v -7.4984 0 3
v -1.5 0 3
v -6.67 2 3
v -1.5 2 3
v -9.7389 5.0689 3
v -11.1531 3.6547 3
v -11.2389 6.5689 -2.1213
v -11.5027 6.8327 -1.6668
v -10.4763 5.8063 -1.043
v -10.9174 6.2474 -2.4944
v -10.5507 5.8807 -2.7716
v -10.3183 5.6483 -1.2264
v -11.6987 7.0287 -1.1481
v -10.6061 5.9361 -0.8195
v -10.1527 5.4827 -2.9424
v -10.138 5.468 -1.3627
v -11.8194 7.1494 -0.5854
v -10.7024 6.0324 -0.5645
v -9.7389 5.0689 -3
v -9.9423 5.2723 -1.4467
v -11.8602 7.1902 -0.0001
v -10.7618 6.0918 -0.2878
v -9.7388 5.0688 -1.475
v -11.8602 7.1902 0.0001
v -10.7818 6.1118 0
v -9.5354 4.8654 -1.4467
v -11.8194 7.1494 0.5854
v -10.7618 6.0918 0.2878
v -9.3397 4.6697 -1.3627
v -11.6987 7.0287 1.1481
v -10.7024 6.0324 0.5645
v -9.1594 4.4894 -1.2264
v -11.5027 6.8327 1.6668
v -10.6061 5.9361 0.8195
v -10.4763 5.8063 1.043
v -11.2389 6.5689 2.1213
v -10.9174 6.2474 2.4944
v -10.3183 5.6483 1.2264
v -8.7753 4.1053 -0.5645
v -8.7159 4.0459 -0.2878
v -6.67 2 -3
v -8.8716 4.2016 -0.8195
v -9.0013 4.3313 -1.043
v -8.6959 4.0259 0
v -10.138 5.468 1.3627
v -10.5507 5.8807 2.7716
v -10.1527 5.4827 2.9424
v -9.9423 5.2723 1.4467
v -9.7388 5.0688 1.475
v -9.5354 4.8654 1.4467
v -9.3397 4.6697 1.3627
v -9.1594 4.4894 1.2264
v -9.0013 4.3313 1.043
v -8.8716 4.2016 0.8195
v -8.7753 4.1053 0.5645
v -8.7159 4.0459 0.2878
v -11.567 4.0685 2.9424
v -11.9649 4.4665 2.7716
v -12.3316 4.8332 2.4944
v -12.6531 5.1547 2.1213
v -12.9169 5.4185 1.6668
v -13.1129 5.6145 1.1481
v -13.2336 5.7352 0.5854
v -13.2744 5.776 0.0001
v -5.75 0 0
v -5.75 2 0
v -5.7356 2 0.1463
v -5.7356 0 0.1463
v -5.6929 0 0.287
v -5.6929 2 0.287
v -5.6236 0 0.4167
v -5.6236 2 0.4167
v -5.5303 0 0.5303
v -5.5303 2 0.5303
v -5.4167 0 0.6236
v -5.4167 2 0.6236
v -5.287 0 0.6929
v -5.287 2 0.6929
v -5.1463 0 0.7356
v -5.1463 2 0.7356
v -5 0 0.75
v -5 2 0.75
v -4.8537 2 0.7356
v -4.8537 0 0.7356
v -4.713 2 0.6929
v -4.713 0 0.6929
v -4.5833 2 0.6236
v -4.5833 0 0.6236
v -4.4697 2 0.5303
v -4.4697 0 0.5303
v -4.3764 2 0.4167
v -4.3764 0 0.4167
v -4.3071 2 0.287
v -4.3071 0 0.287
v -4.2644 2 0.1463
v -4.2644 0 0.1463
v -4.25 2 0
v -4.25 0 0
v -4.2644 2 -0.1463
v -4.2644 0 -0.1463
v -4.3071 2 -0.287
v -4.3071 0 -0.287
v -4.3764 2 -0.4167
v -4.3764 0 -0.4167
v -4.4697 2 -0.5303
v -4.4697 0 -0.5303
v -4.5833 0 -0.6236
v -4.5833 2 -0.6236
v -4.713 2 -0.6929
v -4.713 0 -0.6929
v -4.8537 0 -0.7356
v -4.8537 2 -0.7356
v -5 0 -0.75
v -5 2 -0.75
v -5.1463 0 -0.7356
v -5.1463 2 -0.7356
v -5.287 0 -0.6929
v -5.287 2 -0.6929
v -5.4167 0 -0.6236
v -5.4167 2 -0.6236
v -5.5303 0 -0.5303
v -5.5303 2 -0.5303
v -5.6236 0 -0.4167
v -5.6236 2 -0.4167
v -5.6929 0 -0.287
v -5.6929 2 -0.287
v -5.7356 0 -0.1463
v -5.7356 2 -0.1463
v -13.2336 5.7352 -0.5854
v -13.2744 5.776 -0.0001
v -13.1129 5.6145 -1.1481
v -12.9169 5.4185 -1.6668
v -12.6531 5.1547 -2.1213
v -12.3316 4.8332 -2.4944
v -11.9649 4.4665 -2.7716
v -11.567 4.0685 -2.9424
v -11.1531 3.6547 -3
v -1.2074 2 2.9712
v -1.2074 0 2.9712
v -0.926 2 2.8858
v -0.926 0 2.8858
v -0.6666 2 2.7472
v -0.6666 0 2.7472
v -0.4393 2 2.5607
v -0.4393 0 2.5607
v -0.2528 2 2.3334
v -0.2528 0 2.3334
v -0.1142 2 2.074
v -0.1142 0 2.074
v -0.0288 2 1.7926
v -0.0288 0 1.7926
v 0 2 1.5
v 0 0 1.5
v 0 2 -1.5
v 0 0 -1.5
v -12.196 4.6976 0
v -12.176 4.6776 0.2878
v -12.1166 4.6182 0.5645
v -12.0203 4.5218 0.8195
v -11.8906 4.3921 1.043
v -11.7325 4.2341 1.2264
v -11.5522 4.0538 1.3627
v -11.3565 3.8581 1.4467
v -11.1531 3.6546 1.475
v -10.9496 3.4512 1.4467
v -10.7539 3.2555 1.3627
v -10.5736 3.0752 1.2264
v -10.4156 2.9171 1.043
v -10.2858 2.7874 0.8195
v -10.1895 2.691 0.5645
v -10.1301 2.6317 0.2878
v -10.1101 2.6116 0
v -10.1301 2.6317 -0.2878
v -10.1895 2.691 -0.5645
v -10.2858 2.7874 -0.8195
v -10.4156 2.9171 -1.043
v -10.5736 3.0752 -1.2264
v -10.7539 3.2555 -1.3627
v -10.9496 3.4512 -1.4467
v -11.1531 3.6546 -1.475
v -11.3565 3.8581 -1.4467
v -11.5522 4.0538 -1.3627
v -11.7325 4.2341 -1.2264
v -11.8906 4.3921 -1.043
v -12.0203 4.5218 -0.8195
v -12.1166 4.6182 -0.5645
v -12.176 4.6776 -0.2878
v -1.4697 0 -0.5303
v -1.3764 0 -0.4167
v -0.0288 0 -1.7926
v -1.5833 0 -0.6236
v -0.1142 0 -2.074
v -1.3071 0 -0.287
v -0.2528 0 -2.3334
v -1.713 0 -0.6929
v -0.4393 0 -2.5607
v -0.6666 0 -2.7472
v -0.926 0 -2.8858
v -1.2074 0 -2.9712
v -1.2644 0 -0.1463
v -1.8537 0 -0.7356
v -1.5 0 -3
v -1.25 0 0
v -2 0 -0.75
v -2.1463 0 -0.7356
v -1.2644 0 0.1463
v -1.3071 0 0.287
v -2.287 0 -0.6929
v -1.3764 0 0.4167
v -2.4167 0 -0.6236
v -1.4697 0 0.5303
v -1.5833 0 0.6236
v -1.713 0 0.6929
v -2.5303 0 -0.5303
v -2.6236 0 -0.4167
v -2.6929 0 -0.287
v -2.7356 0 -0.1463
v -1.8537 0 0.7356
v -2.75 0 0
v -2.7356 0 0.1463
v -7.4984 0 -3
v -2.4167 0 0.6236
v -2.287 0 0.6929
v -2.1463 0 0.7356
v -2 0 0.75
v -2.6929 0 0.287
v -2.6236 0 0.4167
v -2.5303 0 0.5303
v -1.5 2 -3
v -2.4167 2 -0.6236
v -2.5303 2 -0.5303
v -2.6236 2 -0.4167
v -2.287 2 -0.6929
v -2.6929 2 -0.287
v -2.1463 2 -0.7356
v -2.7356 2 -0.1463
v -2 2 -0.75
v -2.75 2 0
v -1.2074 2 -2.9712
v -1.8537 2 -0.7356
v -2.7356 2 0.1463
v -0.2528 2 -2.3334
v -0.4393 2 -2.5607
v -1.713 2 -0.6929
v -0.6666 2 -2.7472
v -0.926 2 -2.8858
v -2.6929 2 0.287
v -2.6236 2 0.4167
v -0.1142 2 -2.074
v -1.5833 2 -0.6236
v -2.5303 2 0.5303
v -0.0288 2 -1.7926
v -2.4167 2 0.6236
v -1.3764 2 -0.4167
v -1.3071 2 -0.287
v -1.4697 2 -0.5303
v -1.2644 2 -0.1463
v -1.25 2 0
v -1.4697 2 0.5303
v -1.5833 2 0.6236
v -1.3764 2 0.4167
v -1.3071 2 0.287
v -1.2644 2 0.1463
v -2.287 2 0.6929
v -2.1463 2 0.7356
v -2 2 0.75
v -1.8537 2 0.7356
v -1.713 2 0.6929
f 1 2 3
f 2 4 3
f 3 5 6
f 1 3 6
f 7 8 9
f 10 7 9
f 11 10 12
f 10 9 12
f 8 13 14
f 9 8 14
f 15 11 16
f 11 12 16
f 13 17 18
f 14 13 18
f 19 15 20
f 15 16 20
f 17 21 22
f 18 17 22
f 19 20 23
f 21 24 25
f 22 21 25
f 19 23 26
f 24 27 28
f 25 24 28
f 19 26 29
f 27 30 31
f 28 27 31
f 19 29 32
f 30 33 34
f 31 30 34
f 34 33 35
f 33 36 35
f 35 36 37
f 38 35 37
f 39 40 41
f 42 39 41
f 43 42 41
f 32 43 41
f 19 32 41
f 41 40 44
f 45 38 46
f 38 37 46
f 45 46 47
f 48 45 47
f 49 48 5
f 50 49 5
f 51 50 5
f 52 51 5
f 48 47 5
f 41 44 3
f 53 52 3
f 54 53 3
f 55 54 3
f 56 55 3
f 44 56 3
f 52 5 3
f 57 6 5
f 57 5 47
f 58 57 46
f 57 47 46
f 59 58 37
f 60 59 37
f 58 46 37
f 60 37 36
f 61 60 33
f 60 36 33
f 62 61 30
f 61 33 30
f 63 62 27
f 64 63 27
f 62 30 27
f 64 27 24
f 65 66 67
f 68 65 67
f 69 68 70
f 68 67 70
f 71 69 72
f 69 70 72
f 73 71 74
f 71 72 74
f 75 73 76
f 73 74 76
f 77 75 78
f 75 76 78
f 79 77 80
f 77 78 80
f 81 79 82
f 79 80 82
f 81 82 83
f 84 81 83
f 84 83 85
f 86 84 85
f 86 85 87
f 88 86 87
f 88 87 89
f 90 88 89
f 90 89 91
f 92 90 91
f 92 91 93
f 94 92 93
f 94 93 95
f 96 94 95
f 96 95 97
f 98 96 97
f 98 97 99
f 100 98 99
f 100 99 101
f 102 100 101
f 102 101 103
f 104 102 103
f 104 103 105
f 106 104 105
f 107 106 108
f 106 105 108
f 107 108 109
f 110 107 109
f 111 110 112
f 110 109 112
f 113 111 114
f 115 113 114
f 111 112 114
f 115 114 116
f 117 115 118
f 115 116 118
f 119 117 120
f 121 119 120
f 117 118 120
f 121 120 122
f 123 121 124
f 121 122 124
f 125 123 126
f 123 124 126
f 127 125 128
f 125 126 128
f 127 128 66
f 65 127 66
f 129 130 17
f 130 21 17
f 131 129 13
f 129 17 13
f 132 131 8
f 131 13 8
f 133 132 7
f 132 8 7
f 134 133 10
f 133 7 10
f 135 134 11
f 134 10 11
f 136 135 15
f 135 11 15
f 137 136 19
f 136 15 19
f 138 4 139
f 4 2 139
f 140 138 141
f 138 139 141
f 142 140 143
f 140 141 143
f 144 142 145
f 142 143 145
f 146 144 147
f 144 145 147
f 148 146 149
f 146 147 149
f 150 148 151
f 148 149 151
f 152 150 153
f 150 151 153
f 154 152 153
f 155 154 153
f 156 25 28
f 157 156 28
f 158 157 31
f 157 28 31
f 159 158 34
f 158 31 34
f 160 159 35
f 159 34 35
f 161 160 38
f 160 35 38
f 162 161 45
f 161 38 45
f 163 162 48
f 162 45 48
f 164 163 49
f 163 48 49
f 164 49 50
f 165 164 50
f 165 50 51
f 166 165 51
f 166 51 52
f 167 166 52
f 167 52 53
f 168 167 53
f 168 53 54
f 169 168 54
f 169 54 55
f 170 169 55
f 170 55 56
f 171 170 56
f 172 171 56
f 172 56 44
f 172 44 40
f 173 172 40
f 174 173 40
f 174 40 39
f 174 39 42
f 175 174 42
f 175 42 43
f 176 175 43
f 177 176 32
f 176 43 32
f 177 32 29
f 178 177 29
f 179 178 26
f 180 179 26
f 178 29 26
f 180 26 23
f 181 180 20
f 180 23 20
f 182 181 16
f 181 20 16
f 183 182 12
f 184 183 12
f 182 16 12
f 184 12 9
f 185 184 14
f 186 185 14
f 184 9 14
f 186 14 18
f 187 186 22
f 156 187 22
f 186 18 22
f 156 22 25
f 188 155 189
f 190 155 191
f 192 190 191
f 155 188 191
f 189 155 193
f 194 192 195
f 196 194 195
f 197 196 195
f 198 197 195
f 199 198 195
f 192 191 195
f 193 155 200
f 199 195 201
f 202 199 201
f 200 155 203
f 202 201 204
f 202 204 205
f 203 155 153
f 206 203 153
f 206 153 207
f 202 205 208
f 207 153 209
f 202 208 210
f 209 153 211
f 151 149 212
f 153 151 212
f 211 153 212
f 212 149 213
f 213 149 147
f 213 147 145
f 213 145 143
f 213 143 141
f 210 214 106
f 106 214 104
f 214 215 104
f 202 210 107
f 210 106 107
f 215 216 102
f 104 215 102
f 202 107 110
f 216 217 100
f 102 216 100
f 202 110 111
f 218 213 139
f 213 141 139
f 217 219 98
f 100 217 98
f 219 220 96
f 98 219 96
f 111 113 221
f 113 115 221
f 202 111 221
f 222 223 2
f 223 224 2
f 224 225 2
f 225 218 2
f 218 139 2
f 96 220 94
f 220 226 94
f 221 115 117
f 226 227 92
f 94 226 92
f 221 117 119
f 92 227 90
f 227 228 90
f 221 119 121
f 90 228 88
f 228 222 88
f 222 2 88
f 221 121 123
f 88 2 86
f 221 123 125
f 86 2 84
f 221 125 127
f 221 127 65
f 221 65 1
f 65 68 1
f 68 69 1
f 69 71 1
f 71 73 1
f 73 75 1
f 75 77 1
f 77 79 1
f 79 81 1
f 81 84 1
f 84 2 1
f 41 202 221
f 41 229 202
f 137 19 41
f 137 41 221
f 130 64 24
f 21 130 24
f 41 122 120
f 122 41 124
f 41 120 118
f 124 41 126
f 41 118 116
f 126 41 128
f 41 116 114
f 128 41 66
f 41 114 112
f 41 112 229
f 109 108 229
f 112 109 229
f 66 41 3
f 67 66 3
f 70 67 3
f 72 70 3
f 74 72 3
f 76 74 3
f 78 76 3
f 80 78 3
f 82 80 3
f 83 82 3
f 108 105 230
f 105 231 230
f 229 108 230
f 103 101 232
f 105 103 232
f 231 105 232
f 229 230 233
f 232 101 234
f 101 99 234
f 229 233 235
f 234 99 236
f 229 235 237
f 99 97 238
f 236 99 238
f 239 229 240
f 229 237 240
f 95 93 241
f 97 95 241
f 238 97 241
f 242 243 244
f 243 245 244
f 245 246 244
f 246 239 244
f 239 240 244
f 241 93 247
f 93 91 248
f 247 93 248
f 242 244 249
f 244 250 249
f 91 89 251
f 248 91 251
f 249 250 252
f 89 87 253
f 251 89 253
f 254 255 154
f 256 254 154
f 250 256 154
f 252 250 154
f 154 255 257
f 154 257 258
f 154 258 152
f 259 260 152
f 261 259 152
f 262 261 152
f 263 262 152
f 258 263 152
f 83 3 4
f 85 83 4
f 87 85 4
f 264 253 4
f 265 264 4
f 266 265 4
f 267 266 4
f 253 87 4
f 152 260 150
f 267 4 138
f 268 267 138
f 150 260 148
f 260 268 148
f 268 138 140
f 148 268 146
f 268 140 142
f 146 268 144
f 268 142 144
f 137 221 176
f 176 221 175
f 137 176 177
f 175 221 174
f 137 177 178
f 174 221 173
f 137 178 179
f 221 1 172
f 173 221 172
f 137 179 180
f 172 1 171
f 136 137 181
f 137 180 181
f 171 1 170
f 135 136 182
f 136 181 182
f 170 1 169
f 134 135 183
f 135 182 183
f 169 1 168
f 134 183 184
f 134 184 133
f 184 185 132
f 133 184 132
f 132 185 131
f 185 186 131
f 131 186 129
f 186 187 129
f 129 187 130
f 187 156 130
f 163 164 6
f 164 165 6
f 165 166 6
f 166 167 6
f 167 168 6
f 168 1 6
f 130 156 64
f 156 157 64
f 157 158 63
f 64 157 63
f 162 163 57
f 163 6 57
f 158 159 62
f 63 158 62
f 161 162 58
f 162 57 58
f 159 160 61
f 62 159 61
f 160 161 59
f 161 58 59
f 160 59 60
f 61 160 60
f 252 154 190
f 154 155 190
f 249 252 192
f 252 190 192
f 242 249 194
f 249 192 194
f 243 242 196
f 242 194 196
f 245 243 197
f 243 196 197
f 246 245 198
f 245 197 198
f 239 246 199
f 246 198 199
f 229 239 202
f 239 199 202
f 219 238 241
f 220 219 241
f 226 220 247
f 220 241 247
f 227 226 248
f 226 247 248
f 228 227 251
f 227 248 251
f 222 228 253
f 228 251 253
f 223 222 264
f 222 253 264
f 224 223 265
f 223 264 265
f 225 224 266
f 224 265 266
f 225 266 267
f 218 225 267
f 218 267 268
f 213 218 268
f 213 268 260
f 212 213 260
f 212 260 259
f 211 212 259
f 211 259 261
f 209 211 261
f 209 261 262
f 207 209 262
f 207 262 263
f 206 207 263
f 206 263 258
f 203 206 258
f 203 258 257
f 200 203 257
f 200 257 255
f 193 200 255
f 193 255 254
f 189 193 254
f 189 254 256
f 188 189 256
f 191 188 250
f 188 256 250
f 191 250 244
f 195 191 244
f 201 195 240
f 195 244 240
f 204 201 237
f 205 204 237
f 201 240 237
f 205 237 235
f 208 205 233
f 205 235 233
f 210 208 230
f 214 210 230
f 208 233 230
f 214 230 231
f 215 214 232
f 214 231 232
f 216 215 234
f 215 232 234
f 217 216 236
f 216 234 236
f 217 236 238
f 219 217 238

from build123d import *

# Parameters (mm, degrees)
SALIENTE_EXTRUIR1_DEPTH = 3
REDONDEO1_R             = 3
REDONDEO2_R             = 1.5
CROQUIS3_R              = 1.475
CORTAR_EXTRUIR1_DEPTH   = 15.812114009
CROQUIS4_R              = 0.75
CORTAR_EXTRUIR2_DEPTH   = 15.565263254


with BuildPart() as part:
    # Croquis1 → Saliente-Extruir1 (new, symmetric)
    with BuildSketch(Plane.XY):
        Polygon((0, 0), (-7.498427125, 0), (-13.274377336, 5.775950212), (-11.860163774, 7.190163774), (-6.67, 2), (0, 2), align=None)
    extrude(amount=SALIENTE_EXTRUIR1_DEPTH, both=True)

    # Redondeo1
    redondeo1_edges = [part.edges().sort_by_distance(p)[0] for p in [
        (-12.567270555, 6.483056993, -3),
        (-12.567270555, 6.483056993, 3),
    ]]
    fillet(redondeo1_edges, radius=REDONDEO1_R - 0.0001)  # a hair under: the kernel refuses the full size

    # Redondeo2
    redondeo2_edges = [part.edges().sort_by_distance(p)[0] for p in [
        (0, 1, 3),
        (0, 1, -3),
    ]]
    fillet(redondeo2_edges, radius=REDONDEO2_R)

    # Croquis3 → Cortar-Extruir1 (cut, through all)
    with BuildSketch(Plane(origin=(-2.335, -2.335, 0), x_dir=(0, 0, -1), z_dir=(0.7071067811865485, 0.7071067811865466, 0))):
        with Locations(Location((0, 10.470615793, 0), (0, 0, 90))):
            Circle(CROQUIS3_R)
    extrude(amount=-CORTAR_EXTRUIR1_DEPTH, mode=Mode.SUBTRACT)

    # Croquis4 → Cortar-Extruir2 (cut, through all)
    with BuildSketch(Plane(origin=(0, 2, 0), x_dir=(1, 0, 0), z_dir=(0, 1, 0))):
        with Locations(Location((-5, 0, 0), (0, 0, 180))):
            Circle(CROQUIS4_R)
        with Locations(Location((-2, 0, 0), (0, 0, 180))):
            Circle(CROQUIS4_R)
    extrude(amount=-CORTAR_EXTRUIR2_DEPTH, mode=Mode.SUBTRACT)


solid = part.part
